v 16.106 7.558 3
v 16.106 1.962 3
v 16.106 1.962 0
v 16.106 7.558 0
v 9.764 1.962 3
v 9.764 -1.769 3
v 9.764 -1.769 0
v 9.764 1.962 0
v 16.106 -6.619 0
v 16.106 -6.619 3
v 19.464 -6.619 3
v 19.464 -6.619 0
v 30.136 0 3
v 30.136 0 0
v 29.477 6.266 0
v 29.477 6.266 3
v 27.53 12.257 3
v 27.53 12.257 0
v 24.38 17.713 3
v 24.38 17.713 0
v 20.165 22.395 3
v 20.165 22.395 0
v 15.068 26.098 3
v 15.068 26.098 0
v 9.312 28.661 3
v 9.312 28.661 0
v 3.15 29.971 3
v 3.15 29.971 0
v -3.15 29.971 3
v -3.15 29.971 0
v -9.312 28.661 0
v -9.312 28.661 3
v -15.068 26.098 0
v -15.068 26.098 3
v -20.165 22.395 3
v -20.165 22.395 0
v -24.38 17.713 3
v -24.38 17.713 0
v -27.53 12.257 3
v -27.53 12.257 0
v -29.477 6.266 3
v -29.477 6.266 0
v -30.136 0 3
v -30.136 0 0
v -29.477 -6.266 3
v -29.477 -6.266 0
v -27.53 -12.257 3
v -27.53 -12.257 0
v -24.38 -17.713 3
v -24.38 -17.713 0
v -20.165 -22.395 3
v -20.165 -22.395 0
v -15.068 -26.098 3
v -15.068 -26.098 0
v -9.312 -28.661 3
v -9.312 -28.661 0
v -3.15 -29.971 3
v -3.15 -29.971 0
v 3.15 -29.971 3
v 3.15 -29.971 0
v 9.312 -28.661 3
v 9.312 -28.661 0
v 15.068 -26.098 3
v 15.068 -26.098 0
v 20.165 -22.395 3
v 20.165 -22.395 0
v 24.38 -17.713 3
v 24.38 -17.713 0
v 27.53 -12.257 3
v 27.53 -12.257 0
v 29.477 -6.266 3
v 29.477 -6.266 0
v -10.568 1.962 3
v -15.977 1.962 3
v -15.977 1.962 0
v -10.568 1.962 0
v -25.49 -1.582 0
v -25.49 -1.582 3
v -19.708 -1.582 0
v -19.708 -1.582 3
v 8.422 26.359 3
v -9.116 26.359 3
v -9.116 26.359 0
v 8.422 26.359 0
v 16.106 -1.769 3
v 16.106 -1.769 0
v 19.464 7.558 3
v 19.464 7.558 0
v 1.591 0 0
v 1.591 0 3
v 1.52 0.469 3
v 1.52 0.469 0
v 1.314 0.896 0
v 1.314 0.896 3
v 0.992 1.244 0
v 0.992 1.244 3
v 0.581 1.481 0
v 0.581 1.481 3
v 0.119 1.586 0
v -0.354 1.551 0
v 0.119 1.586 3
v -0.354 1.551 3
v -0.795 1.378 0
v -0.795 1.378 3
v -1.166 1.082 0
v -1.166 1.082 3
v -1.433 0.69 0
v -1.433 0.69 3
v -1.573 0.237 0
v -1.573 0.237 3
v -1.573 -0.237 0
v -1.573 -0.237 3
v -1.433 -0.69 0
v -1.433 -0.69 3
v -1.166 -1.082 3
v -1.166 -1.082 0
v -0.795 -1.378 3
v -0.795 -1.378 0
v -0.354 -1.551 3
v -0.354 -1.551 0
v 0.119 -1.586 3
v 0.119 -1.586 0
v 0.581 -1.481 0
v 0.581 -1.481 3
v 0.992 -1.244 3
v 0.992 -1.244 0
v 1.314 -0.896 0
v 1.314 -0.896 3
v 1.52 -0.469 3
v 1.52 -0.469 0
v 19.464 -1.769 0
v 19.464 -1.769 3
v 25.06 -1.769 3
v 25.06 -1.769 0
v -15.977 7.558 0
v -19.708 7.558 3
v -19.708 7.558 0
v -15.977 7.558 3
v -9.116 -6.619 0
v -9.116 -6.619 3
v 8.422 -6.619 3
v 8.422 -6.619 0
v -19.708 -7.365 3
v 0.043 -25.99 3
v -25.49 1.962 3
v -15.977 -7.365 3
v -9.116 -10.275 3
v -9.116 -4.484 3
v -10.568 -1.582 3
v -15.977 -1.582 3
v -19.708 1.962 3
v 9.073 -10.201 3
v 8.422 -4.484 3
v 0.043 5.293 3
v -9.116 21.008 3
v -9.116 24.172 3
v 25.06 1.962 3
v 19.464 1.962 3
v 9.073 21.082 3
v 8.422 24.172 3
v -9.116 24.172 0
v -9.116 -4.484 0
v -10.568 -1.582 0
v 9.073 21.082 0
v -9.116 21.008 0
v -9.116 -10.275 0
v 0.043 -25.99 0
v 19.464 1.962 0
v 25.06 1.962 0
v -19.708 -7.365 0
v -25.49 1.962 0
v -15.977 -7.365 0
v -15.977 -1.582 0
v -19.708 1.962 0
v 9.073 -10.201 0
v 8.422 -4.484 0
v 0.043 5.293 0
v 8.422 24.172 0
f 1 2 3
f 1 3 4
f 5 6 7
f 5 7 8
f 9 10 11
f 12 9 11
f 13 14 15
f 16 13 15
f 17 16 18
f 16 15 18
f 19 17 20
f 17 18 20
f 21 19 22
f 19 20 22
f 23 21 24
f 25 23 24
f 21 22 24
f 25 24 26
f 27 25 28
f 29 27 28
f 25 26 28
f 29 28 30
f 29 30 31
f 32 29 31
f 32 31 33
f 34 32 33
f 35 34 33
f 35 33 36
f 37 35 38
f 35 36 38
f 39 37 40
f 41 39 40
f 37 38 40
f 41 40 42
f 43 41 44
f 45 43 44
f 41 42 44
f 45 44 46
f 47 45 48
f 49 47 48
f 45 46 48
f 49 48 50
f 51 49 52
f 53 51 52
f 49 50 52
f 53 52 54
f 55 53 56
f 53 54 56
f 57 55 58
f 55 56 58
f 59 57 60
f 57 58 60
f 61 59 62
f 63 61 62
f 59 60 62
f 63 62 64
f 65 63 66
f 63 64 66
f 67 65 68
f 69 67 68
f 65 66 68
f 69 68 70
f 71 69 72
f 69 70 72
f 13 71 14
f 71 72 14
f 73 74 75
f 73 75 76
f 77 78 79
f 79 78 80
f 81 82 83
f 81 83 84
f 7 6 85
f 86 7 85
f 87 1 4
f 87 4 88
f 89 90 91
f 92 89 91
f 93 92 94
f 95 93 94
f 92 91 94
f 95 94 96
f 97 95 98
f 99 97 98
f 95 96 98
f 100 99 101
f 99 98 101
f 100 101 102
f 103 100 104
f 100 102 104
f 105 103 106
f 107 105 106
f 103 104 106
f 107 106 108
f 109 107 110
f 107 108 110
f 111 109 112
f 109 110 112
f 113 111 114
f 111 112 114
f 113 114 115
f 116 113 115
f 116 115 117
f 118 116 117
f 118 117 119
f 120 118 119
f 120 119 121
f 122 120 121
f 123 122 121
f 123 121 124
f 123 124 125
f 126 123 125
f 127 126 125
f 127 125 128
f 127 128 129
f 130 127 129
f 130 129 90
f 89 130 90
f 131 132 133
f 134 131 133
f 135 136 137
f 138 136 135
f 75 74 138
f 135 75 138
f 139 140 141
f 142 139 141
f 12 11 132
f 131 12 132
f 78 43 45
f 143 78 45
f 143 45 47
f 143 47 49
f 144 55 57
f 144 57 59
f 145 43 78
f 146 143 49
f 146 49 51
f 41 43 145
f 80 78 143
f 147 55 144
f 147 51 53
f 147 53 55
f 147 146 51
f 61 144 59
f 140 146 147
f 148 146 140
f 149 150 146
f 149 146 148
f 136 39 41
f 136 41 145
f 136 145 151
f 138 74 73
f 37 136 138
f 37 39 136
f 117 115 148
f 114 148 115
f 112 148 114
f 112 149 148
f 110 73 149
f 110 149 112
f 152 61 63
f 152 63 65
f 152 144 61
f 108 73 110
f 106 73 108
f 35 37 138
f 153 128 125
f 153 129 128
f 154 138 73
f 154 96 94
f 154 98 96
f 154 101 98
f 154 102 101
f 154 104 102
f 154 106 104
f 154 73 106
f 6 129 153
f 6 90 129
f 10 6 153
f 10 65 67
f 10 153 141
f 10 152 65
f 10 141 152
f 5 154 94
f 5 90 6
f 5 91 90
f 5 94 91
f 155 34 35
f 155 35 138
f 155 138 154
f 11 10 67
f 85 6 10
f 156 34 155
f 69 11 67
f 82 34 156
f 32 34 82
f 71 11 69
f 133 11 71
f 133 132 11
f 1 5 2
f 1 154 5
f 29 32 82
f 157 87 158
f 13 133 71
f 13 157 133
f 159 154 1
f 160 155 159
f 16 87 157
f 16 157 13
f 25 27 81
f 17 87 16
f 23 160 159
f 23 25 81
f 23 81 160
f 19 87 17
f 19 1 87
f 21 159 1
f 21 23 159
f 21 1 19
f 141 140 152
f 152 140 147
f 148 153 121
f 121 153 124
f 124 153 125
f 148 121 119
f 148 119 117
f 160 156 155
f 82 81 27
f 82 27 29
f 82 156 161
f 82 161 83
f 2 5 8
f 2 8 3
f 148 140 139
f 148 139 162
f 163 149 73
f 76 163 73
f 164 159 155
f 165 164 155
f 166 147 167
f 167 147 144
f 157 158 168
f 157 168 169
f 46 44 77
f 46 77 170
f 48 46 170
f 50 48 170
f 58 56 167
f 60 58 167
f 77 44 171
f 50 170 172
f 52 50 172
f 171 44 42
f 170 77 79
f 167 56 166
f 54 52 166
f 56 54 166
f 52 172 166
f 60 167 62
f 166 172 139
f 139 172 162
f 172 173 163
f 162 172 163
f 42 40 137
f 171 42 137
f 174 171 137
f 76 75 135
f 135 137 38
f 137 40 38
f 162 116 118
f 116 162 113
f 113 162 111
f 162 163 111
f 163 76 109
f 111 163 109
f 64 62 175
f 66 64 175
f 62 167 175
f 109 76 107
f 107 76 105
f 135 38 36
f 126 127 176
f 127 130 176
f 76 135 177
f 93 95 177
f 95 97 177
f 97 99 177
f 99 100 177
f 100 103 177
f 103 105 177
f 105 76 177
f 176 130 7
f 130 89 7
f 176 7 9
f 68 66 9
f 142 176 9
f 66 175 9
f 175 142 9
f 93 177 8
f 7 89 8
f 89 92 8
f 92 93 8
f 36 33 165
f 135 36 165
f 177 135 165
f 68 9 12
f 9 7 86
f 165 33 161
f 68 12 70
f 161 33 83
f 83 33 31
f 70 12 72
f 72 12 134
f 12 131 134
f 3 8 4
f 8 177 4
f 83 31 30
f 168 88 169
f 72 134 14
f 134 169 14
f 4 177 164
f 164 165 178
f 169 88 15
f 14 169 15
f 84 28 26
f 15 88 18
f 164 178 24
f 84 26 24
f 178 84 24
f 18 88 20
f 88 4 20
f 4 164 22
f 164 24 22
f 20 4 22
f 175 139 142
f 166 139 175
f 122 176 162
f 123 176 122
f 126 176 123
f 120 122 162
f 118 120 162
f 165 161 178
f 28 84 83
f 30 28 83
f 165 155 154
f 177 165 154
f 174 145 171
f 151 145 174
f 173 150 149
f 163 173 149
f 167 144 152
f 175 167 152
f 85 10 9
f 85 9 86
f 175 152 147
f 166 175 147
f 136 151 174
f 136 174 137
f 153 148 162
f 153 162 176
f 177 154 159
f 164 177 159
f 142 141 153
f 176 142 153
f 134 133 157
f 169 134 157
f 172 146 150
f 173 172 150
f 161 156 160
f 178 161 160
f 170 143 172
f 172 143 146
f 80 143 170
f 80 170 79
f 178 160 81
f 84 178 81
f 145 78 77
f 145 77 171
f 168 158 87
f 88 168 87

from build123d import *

# Parameters (mm, degrees)
F0_R      = 30.135624
F1_DEPTH  = 3
F2_R      = 1.590818
F3_DEPTH  = 25
F5_DEPTH  = 25
F6_W      = 3.730636
F6_H      = 14.922548
F7_DEPTH  = 25
F8_W      = 14.922549
F8_H      = 3.544105
F9_DEPTH  = 25
F10_W     = 3.357574
F10_H     = 14.176421
F11_DEPTH = 25
F12_W     = 15.295613
F12_H     = 3.730637
F13_DEPTH = 25
F14_W     = 17.537619
F14_H     = 2.187502
F14_H_2   = 2.134302
F15_DEPTH = 25


with BuildPart() as f1:
    # F0 (on Top) → F1 (new body)
    with BuildSketch(Plane.XY):
        Circle(F0_R)
    extrude(amount=F1_DEPTH)

    # F2 (on face) → F3 (cut)
    with BuildSketch(Plane.XY.offset(3)):
        Circle(F2_R)
    extrude(amount=-F3_DEPTH, mode=Mode.SUBTRACT)

    # F4 (on face) → F5 (cut)
    with BuildSketch(Plane.XY.offset(3)):
        Polygon((0.042525, 5.293039), (9.073219, 21.08197), (-9.115743, 21.008315), align=None)
        Polygon((0.042525, -25.99019), (9.073219, -10.201259), (-9.115743, -10.274914), align=None)
    extrude(amount=-F5_DEPTH, mode=Mode.SUBTRACT)

    # F6 (on face) → F7 (cut)
    with BuildSketch(Plane.XY.offset(3)):
        with Locations((-17.842693, 0.09647)):
            Rectangle(F6_W, F6_H)
    extrude(amount=-F7_DEPTH, mode=Mode.SUBTRACT)

    # F8 (on face) → F9 (cut)
    with BuildSketch(Plane.XY.offset(3)):
        with Locations((-18.029225, 0.189735)):
            Rectangle(F8_W, F8_H)
    extrude(amount=-F9_DEPTH, mode=Mode.SUBTRACT)

    # F10 (on face) → F11 (cut)
    with BuildSketch(Plane.XY.offset(3)):
        with Locations((17.78489, 0.469533)):
            Rectangle(F10_W, F10_H)
    extrude(amount=-F11_DEPTH, mode=Mode.SUBTRACT)

    # F12 (on face) → F13 (cut)
    with BuildSketch(Plane.XY.offset(3)):
        with Locations((17.411827, 0.096469)):
            Rectangle(F12_W, F12_H)
    extrude(amount=-F13_DEPTH, mode=Mode.SUBTRACT)

    # F14 (on face) → F15 (cut)
    with BuildSketch(Plane.XY.offset(3)):
        with Locations((-0.346934, 25.265625)):
            Rectangle(F14_W, F14_H)
        with Locations((-0.346934, -5.551526)):
            Rectangle(F14_W, F14_H_2)
    extrude(amount=-F15_DEPTH, mode=Mode.SUBTRACT)


solid = f1.part
